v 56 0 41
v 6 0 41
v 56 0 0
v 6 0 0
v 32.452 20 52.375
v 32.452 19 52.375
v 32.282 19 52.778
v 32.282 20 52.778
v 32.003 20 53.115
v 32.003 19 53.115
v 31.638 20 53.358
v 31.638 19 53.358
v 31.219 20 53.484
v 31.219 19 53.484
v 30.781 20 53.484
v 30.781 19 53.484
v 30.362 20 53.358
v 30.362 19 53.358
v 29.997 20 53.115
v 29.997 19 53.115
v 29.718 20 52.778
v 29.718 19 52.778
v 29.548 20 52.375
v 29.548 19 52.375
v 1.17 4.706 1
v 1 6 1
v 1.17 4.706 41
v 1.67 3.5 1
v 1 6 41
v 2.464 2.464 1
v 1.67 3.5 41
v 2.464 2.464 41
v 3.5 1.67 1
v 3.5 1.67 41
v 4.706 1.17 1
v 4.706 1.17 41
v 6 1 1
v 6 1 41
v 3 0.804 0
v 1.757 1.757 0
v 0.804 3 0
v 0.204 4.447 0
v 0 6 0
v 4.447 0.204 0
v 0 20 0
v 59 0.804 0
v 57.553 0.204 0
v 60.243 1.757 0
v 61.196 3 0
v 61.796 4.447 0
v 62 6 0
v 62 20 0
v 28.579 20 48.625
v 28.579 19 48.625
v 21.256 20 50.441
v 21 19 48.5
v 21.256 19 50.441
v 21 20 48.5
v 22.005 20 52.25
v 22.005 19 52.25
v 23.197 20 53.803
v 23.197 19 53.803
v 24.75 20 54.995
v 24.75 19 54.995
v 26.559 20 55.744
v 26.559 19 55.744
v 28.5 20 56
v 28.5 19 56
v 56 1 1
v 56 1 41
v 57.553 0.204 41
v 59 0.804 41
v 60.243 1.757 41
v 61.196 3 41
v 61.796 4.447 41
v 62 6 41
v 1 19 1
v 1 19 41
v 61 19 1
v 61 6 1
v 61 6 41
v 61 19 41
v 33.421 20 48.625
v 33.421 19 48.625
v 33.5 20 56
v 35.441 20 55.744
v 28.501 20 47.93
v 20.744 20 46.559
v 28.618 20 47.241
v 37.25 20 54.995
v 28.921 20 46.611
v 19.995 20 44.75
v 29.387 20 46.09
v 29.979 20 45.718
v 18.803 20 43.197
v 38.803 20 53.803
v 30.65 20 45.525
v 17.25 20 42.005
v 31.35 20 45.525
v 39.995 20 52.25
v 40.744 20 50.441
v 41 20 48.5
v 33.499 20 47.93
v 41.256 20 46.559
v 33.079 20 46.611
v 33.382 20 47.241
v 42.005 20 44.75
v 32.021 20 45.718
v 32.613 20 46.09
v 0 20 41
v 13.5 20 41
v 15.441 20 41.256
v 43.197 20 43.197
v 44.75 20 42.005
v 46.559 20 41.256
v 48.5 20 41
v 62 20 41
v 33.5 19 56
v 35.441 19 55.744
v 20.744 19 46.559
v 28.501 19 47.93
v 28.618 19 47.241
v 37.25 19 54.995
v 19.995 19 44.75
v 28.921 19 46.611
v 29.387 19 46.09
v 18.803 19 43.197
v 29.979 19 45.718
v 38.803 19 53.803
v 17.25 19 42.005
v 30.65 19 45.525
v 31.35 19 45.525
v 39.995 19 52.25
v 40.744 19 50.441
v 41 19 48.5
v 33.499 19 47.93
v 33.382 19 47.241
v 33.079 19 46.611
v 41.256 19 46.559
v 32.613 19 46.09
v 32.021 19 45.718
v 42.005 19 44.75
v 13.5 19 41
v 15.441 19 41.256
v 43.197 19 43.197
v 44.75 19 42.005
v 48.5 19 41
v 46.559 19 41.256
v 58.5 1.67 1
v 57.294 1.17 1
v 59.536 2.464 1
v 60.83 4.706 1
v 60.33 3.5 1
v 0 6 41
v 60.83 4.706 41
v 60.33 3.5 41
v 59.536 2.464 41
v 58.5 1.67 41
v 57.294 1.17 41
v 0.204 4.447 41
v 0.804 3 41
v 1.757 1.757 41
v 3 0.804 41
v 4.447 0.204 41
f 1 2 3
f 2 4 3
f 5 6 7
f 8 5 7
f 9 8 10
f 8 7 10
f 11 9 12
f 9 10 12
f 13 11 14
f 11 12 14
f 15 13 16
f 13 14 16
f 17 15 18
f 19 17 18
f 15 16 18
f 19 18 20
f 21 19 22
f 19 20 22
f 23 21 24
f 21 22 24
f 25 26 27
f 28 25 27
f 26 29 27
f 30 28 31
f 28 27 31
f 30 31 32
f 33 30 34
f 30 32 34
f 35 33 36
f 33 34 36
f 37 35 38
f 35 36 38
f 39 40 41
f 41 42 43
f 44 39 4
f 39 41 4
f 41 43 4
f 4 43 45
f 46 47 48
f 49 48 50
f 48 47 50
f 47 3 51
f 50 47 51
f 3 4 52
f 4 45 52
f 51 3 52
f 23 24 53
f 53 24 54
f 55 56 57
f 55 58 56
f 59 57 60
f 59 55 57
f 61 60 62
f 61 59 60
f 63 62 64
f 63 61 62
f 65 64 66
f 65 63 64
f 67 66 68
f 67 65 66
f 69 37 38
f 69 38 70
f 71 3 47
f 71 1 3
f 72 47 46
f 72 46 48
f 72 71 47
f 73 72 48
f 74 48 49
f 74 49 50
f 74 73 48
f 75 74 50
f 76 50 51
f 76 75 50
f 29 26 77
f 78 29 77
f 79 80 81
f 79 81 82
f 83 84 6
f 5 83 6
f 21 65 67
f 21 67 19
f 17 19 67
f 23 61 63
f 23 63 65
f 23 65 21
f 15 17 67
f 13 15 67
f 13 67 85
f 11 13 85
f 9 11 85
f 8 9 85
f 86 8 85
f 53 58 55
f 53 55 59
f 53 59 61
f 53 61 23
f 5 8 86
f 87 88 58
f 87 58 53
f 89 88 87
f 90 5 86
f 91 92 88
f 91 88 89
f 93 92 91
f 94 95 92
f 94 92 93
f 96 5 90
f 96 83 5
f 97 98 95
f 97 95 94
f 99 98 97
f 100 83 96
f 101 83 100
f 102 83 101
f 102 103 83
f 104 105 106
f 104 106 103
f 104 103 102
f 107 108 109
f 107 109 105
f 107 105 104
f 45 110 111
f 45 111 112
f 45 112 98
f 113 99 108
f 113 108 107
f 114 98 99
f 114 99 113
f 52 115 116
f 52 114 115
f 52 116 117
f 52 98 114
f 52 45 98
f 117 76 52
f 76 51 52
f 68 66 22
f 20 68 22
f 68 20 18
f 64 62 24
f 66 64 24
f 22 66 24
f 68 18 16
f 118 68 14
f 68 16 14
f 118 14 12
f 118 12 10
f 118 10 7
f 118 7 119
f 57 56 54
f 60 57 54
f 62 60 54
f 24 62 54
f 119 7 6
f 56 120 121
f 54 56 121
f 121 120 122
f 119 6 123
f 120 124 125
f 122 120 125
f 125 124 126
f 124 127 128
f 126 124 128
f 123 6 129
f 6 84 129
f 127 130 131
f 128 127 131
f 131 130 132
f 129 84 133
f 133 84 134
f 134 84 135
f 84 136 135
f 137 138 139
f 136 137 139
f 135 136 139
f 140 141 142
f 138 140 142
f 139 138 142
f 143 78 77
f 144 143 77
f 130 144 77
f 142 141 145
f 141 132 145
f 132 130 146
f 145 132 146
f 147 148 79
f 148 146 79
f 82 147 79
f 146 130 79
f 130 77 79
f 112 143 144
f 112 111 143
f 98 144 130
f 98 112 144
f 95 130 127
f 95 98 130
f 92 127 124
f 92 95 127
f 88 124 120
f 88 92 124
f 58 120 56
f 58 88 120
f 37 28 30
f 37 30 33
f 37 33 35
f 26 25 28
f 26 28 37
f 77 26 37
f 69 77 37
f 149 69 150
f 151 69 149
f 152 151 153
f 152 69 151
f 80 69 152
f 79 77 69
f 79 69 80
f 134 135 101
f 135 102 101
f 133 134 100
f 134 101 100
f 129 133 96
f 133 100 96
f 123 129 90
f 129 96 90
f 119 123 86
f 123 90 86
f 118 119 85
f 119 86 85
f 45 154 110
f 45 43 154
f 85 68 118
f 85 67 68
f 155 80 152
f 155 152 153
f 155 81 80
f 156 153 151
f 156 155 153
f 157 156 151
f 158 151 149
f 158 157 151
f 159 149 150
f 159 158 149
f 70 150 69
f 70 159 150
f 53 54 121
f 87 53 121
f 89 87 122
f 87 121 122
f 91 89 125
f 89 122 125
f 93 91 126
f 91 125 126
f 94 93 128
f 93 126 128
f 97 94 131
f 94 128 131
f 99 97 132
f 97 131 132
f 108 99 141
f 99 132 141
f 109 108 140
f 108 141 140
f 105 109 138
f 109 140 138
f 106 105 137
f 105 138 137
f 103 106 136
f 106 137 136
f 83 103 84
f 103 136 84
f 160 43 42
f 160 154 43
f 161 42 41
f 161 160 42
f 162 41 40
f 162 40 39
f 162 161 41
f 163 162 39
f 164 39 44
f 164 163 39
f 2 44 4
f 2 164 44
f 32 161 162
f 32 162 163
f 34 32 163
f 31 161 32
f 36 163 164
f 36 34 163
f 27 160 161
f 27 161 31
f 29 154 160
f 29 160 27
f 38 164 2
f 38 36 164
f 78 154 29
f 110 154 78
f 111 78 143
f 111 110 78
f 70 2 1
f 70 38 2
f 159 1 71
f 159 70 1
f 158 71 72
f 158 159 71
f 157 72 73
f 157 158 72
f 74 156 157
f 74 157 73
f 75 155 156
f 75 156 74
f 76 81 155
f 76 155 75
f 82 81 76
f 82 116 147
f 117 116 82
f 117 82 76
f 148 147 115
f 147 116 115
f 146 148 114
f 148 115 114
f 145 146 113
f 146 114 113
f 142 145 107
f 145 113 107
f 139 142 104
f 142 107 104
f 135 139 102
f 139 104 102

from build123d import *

# Parameters (mm, degrees)
F0_W     = 62
F0_H     = 20
F1_DEPTH = 1
F2_W     = 62
F2_H     = 20
F2_W_2   = 60
F2_H_2   = 18
F3_DEPTH = 40
F4_R     = 5
F5_R     = 6
F6_W     = 20
F6_H     = 1
F7_DEPTH = 15
F9_DEPTH = 1
F10_R    = 7.49999


# Not quite as in the source:
# - a fillet or chamfer is up to 0.001 mm smaller than in the source, because OpenCascade refuses the exact size


with BuildPart() as f1:
    # F0 (on Top) → F1 (new body)
    with BuildSketch(Plane.XY):
        with Locations((31, 10)):
            Rectangle(F0_W, F0_H)
    extrude(amount=F1_DEPTH)

    # F2 (on face) → F3 (join)
    with BuildSketch(Plane.XY.offset(1)):
        with Locations((31, 10)):
            Rectangle(F2_W, F2_H)
        with Locations((31, 10)):
            Rectangle(F2_W_2, F2_H_2, mode=Mode.SUBTRACT)
    extrude(amount=F3_DEPTH)

    # F4
    f4_edges = [f1.edges().sort_by_distance(p)[0] for p in [
        (1, 1, 21),
        (61, 1, 21),
    ]]
    fillet(f4_edges, radius=F4_R)

    # F5
    f5_edges = [f1.edges().sort_by_distance(p)[0] for p in [
        (0, 0, 20.5),
        (62, 0, 20.5),
    ]]
    fillet(f5_edges, radius=F5_R)

    # F6 (on face) → F7 (join)
    with BuildSketch(Plane.XY.offset(41)):
        with Locations((31, 19.5)):
            Rectangle(F6_W, F6_H)
    extrude(amount=F7_DEPTH)

    # F8 (on face) → F9 (cut, through all)
    with BuildSketch(Plane.XZ.offset(-19)):
        with BuildLine():
            Line((33.4206145914, 48.625), (32.4523687548, 52.375))
            ThreePointArc((32.4523687548, 52.375), (31, 53.5), (29.5476312452, 52.375))
            Line((29.5476312452, 52.375), (28.5793854086, 48.625))
            ThreePointArc((28.5793854086, 48.625), (31, 45.5), (33.4206145914, 48.625))
        make_face()
    extrude(amount=-F9_DEPTH, mode=Mode.SUBTRACT)

    # F10 (radius 7.5 in the source; OpenCascade refuses exactly that, so slightly less here)
    f10_edges = [f1.edges().sort_by_distance(p)[0] for p in [
        (21, 19.5, 56),
        (41, 19.5, 56),
        (41, 19.5, 41),
        (21, 19.5, 41),
    ]]
    fillet(f10_edges, radius=F10_R)


solid = f1.part
